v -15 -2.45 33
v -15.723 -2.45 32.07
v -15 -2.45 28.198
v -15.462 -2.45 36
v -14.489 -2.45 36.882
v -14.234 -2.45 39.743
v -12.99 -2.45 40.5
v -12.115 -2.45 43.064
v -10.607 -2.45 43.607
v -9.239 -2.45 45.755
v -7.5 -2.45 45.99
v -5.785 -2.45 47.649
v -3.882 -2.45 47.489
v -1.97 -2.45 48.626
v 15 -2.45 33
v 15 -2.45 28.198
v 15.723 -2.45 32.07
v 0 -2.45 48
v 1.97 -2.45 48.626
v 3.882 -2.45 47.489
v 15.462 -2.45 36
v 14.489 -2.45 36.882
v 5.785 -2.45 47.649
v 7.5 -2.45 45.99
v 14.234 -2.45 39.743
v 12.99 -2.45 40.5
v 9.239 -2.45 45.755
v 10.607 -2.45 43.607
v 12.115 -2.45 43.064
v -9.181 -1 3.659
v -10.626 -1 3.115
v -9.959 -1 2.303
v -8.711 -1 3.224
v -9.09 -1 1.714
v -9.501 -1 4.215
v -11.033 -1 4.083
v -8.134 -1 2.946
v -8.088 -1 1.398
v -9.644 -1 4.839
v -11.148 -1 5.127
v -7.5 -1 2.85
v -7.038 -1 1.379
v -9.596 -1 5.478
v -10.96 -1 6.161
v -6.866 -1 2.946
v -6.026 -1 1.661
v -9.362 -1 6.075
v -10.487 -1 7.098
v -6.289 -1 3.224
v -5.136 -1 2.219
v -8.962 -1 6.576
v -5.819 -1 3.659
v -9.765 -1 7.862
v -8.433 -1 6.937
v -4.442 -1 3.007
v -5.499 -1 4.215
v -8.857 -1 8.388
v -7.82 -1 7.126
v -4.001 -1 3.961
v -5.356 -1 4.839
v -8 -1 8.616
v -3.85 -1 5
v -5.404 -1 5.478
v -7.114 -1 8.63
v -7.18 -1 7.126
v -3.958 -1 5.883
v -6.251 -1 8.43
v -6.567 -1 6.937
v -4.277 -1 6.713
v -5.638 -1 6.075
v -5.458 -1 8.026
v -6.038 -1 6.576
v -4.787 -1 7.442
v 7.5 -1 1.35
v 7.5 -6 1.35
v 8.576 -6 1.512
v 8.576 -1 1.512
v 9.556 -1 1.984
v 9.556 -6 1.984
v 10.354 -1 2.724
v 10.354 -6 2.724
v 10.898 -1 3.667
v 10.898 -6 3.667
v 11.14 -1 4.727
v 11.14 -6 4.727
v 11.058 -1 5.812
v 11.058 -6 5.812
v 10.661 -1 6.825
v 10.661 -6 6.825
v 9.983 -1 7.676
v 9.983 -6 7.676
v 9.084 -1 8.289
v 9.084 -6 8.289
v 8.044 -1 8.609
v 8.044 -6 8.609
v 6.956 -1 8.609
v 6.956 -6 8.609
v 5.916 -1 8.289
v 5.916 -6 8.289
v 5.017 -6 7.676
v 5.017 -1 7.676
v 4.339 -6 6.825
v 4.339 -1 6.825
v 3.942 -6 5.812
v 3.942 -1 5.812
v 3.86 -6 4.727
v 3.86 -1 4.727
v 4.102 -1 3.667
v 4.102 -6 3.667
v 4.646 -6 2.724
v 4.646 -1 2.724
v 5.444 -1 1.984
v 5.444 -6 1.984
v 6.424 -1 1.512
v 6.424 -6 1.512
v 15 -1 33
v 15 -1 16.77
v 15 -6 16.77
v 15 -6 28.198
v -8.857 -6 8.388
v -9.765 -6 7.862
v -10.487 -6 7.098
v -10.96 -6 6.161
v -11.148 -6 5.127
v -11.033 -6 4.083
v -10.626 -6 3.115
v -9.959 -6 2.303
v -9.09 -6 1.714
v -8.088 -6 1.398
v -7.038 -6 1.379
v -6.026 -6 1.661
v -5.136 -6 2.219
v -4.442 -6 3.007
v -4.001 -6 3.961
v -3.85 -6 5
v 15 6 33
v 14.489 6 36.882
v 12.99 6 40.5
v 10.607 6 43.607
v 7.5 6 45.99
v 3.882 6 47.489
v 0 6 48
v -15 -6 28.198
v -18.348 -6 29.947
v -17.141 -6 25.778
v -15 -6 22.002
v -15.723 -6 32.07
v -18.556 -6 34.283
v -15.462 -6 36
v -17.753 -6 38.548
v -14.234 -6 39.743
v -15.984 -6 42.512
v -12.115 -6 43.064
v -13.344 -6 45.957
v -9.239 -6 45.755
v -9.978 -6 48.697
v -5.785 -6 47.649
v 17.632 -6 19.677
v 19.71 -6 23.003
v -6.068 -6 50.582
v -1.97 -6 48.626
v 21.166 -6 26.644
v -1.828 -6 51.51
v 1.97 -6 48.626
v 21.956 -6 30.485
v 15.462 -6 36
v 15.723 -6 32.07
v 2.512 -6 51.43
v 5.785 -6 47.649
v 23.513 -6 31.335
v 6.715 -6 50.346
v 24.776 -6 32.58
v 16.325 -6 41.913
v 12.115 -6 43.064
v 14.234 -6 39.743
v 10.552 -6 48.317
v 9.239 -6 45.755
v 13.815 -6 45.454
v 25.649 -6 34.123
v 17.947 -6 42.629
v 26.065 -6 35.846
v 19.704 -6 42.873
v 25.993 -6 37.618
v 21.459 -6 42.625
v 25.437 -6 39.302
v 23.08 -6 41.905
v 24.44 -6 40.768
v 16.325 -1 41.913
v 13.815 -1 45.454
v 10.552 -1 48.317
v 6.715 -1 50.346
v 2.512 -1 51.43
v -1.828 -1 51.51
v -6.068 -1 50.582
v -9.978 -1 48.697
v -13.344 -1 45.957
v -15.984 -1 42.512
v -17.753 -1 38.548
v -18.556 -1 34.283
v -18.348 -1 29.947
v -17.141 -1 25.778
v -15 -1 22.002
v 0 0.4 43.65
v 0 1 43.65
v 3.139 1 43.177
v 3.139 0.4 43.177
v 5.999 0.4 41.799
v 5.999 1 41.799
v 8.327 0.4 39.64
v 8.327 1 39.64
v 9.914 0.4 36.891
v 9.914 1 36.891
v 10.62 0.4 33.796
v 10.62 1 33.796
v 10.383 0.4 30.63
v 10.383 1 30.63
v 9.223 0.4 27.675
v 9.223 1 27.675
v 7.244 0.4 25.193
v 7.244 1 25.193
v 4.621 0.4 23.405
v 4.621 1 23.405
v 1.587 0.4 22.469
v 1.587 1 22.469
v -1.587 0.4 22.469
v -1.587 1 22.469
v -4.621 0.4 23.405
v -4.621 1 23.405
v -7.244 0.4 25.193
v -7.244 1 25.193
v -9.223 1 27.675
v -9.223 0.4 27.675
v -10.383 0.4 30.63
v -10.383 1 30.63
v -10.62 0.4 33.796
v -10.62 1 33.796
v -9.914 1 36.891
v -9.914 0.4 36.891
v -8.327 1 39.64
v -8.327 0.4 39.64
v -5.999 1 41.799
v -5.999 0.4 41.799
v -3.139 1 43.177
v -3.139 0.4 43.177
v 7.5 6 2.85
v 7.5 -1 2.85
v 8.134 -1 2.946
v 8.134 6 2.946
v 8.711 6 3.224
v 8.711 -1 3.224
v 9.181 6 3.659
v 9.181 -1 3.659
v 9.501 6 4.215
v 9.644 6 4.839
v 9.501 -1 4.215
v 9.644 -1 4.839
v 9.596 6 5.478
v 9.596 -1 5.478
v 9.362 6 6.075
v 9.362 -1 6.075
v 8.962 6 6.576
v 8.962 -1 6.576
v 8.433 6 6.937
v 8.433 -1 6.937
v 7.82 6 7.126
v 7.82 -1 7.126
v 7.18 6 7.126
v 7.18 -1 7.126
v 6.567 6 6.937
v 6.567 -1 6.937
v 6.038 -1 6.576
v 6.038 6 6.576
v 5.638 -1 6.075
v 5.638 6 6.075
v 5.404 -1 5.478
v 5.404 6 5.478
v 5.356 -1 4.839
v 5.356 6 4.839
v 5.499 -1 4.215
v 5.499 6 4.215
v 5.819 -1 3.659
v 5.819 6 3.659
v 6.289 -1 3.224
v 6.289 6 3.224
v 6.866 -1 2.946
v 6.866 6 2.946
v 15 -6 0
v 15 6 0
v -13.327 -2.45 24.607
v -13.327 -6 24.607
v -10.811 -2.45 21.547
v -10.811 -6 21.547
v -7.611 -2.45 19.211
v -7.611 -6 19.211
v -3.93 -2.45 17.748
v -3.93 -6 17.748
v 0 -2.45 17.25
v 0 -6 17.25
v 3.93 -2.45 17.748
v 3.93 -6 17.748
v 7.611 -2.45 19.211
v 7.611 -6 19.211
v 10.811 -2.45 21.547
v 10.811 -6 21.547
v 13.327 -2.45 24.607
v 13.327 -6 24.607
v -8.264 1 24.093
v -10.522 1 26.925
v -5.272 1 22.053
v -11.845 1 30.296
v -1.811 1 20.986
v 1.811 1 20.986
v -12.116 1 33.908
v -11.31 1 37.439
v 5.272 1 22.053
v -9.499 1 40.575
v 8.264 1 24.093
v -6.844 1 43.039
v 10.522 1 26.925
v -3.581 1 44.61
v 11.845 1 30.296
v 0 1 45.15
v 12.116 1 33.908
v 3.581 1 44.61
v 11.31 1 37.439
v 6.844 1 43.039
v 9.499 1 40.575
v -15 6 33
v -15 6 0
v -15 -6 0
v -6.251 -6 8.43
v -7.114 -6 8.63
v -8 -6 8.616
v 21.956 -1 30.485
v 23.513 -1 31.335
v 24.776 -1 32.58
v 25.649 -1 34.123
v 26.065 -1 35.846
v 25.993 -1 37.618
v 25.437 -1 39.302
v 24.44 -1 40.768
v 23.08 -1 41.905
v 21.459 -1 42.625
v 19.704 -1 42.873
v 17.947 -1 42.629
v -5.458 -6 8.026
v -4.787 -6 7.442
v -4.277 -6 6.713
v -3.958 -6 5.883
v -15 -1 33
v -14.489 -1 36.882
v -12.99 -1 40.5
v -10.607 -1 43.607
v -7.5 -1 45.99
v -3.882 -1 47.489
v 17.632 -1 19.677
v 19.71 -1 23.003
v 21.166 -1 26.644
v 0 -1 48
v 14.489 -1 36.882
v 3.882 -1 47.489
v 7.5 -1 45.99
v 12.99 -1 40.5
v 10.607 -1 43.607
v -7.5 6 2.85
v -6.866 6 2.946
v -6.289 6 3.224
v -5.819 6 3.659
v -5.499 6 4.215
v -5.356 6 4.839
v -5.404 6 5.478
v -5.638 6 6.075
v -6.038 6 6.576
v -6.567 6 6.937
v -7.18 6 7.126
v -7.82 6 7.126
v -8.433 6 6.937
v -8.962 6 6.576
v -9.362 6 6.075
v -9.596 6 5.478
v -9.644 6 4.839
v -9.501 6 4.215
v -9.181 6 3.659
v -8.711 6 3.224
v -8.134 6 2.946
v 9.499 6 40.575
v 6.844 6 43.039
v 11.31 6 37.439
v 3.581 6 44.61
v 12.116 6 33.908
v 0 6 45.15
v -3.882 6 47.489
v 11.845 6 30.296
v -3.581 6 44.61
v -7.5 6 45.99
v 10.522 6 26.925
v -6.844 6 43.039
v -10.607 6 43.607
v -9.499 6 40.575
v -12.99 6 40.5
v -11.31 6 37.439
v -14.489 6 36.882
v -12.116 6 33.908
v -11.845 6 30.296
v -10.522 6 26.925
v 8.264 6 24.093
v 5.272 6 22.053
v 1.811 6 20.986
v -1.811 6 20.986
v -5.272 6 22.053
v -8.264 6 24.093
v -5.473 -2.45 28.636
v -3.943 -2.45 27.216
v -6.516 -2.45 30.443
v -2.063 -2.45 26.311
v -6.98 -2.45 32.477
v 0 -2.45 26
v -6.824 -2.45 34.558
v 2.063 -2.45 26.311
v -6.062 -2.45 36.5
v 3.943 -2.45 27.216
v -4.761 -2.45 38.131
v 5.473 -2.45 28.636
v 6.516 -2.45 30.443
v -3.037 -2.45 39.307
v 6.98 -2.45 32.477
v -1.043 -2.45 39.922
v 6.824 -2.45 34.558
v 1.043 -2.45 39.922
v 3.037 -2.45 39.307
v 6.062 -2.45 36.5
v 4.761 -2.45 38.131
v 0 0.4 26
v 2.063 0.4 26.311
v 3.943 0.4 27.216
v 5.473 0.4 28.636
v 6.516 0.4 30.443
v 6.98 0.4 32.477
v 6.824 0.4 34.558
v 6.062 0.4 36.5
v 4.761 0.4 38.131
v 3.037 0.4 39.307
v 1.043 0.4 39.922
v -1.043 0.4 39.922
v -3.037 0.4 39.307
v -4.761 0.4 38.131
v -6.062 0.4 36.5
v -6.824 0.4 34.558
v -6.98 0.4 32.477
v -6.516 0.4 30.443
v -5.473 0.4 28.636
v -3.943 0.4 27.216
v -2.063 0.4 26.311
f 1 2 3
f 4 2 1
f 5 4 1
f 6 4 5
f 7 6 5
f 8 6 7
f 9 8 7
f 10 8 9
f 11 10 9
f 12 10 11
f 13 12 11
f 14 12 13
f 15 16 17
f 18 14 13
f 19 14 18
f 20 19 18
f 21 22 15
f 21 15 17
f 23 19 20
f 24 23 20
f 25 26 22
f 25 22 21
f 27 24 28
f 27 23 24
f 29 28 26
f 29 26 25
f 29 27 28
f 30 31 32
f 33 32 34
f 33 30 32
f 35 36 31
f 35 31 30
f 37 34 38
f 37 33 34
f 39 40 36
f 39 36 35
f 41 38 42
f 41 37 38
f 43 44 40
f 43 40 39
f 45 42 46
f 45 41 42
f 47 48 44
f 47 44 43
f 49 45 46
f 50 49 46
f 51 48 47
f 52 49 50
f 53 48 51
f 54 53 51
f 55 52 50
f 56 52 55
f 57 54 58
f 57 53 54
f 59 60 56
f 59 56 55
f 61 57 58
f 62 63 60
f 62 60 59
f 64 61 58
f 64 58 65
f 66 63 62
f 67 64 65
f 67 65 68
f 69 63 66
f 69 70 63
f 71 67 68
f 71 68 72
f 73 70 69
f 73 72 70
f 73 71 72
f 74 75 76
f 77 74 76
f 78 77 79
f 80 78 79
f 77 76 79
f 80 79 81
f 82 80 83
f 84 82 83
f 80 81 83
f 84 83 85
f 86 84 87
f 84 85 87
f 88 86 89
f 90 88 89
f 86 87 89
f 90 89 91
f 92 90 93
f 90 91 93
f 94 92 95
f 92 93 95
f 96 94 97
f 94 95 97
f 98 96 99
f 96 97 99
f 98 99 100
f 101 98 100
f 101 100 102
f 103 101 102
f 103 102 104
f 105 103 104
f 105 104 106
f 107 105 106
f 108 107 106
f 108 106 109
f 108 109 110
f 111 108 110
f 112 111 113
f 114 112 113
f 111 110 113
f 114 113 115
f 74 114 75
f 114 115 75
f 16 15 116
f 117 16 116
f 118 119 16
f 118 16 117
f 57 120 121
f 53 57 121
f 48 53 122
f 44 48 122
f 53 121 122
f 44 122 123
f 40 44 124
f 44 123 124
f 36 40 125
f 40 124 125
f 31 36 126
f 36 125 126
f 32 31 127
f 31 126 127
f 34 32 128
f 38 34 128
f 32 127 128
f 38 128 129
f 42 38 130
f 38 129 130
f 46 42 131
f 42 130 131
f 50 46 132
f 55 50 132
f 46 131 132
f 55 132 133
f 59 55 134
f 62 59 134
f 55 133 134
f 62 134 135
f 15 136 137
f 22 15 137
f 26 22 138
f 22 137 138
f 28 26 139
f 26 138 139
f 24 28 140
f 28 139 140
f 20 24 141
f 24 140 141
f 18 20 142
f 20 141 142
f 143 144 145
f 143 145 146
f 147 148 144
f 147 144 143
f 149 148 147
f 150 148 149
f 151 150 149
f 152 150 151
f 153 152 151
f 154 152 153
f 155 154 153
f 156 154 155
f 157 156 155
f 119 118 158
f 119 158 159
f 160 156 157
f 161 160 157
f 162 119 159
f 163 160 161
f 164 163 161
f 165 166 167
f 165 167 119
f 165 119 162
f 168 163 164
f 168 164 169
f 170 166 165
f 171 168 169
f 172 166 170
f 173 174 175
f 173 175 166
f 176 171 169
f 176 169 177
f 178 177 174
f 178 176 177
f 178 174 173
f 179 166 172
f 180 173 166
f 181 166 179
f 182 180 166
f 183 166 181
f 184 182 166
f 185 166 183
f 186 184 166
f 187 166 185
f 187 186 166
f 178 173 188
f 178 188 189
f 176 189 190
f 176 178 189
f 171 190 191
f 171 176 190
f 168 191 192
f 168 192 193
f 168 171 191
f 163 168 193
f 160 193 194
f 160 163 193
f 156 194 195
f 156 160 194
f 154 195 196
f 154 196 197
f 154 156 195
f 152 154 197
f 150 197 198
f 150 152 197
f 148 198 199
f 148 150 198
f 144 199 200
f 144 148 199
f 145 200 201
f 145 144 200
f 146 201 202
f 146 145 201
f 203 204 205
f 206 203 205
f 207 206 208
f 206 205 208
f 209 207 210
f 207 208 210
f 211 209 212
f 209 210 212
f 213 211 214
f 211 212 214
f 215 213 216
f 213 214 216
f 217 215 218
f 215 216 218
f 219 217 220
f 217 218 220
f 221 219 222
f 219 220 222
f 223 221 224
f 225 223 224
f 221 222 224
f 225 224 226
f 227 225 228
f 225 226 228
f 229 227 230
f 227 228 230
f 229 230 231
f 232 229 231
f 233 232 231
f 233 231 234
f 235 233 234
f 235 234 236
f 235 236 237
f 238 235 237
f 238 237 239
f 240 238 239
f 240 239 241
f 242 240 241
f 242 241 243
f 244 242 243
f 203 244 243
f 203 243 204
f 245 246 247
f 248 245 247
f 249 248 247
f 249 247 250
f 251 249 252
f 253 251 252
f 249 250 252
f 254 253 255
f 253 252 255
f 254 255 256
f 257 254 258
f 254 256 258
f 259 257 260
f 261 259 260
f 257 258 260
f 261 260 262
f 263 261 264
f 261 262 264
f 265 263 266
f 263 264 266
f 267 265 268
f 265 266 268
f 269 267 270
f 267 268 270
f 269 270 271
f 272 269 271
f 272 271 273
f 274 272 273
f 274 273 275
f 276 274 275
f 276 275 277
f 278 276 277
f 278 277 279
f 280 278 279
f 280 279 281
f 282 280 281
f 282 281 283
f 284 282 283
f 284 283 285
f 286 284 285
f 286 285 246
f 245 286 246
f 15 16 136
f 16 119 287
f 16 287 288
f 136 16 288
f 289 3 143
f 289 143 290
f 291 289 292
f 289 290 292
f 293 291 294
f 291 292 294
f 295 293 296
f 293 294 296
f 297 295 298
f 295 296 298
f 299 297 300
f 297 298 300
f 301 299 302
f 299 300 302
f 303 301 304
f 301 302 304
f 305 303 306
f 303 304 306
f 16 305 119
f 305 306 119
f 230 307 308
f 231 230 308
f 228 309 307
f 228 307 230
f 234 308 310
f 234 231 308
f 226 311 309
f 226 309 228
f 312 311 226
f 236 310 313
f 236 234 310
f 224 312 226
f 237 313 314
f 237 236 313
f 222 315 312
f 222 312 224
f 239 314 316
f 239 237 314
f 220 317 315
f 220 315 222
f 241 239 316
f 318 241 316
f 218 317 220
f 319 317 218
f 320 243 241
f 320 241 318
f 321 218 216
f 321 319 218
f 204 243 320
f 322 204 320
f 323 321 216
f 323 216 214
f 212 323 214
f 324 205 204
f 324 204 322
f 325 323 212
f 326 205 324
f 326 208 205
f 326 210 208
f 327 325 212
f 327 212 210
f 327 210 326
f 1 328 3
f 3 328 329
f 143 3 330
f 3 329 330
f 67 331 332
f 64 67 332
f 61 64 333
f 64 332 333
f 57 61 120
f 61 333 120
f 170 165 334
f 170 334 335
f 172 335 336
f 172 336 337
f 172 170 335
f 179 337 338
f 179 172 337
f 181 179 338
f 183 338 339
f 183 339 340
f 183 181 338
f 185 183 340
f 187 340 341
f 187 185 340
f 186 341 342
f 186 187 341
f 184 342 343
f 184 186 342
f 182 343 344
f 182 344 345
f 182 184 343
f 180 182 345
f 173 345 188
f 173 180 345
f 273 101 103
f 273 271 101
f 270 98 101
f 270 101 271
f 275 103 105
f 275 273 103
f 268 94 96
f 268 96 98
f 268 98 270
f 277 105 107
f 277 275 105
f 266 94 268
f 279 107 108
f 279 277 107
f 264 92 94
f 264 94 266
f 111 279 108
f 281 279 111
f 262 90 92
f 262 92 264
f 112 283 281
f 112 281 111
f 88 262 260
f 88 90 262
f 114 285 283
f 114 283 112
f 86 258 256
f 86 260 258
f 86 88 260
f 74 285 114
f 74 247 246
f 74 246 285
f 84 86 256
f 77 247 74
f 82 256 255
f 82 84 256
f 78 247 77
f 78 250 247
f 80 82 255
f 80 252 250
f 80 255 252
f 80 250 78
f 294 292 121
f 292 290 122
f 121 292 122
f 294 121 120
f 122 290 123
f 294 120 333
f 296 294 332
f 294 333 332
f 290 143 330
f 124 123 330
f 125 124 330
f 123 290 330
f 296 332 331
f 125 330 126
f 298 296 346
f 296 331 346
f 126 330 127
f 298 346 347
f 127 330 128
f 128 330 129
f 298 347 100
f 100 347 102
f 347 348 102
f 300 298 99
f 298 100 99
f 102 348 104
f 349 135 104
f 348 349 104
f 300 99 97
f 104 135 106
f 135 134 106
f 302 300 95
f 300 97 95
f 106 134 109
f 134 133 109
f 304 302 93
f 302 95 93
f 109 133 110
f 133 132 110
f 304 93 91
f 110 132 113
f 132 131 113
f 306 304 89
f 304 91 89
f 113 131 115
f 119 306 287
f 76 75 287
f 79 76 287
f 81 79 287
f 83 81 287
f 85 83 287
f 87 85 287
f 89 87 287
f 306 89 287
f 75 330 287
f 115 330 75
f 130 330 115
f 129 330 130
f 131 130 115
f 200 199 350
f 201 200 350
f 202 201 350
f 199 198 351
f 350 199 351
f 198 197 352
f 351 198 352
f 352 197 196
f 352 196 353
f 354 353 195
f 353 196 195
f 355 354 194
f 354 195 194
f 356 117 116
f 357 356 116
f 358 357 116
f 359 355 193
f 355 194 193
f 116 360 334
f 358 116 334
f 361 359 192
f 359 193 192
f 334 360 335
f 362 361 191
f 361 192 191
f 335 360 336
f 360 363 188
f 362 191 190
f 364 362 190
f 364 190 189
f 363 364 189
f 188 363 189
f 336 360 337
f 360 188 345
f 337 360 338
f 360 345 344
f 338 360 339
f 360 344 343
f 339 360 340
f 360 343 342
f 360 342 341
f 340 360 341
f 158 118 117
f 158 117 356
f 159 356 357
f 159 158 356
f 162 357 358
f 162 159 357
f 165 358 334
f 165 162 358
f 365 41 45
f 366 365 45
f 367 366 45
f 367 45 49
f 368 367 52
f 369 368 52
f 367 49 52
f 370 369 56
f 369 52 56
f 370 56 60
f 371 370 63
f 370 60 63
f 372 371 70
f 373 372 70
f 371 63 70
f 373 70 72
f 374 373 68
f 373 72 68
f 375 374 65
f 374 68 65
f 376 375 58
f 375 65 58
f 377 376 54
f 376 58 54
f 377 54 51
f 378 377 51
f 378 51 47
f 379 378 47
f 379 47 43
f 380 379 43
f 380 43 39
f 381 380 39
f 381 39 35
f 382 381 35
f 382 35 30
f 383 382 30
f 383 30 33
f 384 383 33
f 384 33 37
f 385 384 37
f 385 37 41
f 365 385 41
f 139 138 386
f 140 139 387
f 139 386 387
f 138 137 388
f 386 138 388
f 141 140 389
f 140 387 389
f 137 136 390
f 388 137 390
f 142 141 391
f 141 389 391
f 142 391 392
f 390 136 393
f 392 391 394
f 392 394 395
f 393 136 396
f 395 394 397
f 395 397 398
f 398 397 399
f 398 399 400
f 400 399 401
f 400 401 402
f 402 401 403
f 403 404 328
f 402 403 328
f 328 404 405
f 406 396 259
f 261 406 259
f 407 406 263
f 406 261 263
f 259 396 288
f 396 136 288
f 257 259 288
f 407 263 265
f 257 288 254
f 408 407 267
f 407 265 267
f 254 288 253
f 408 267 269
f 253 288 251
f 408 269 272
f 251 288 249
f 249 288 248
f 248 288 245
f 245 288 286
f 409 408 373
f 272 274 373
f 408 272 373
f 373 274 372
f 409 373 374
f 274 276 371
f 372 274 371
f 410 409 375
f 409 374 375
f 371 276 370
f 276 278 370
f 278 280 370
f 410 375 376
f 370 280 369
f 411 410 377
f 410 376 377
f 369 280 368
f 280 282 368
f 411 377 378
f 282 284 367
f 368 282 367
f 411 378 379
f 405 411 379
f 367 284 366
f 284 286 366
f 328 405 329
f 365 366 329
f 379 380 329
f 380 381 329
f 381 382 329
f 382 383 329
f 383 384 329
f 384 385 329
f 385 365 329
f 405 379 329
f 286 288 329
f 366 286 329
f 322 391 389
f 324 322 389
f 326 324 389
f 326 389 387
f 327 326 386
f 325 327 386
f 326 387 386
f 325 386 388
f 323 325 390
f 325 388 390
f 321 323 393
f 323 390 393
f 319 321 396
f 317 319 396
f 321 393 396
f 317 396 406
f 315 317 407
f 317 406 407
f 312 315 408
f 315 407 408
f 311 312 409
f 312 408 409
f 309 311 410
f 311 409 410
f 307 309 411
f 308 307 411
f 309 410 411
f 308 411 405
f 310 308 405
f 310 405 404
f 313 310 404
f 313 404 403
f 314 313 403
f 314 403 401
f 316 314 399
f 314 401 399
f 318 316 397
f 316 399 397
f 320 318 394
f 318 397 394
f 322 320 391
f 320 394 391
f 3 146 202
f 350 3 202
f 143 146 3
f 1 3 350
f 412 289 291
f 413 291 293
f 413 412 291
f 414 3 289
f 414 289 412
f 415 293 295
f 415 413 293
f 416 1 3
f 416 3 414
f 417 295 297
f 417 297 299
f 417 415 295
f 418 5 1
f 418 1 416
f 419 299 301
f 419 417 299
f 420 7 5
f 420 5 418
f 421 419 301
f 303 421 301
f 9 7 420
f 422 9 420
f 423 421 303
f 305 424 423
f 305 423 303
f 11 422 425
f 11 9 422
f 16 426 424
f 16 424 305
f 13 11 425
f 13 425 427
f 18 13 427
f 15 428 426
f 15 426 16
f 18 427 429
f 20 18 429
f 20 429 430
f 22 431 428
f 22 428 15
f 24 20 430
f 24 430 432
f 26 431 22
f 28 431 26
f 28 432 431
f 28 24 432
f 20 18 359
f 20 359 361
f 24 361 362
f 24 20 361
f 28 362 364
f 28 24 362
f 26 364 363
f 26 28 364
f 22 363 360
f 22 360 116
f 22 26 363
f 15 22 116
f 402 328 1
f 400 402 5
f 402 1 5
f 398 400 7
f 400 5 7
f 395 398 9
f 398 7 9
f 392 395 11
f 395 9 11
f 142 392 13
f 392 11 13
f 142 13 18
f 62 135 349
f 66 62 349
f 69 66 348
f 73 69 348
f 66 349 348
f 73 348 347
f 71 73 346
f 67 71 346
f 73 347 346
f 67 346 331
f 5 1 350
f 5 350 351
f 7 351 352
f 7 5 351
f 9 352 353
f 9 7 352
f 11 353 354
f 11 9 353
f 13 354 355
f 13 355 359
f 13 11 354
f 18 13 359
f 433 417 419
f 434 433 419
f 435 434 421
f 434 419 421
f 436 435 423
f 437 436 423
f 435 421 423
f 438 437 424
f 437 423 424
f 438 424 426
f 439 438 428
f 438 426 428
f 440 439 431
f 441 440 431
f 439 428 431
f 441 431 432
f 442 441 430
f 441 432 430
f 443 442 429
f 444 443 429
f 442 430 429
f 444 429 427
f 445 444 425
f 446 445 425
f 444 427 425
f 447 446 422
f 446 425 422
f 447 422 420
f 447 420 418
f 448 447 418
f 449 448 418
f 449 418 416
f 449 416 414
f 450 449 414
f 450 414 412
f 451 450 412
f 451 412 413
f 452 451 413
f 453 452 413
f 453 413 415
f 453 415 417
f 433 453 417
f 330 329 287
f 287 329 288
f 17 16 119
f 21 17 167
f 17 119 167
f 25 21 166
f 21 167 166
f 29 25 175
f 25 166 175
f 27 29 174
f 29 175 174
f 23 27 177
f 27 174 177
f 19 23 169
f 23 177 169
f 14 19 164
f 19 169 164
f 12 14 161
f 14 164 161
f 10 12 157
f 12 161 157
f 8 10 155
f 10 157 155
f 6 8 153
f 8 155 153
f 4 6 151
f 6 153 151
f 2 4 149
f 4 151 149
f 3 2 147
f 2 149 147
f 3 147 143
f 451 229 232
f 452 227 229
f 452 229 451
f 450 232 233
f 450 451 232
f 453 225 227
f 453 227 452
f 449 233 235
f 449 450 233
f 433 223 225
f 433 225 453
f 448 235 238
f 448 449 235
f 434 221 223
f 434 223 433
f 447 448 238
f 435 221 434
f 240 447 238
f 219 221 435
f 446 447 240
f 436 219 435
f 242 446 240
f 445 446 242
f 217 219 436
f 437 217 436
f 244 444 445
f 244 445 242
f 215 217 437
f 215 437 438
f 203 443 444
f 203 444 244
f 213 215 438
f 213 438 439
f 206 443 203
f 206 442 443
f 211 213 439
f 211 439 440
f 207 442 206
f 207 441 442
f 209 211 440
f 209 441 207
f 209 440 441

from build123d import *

# Parameters (mm, degrees)
EXTRUDE_873_DEPTH      = 48
FILLET_1_R             = 15
SKETCH_2533_R          = 1
EXTRUDE_4839_DEPTH     = 5
SKETCH_1_4_R           = 15.75
CUT_EXTRUDE_5054_DEPTH = 3.55
SKETCH_1_5_R           = 2.15
SKETCH_1_5_R_2         = 7
CUT_EXTRUDE_5752_DEPTH = 12
SKETCH_5896_R          = 12.15
SKETCH_5896_R_2        = 10.65
CUT_EXTRUDE_6261_DEPTH = 5
SKETCH_2_3_R           = 10.65
CUT_EXTRUDE_6307_DEPTH = 5.6
SKETCH_7_R             = 2.15
SKETCH_7_R_2           = 3.65
CUT_EXTRUDE_6391_DEPTH = 5


with BuildPart() as part:
    # Sketch 353 → Extrude 873 (new body)
    with BuildSketch(Plane.XY):
        Polygon((-1e-08, 3.5), (-15, 3.5), (-15, -6), (15, -6), (15, 3.5), align=None)
        with BuildLine():
            Line((-15, 6), (-15, 3.5))
            Line((-15, 3.5), (-1e-08, 3.5))
            ThreePointArc((-1e-08, 3.5), (-4.330127024, 4.138593385), (-8.291561976, 6))
            Line((-8.291561976, 6), (-15, 6))
        make_face()
        with BuildLine():
            ThreePointArc((-8.291561976, 6), (-4.330127024, 4.138593385), (-1e-08, 3.5))
            ThreePointArc((-1e-08, 3.5), (4.330127014, 4.138593382), (8.291561976, 6))
            Line((8.291561976, 6), (-8.291561976, 6))
        make_face()
        with BuildLine():
            ThreePointArc((8.291561976, 6), (4.330127014, 4.138593382), (-1e-08, 3.5))
            Line((-1e-08, 3.5), (15, 3.5))
            Line((15, 3.5), (15, 6))
            Line((15, 6), (8.291561976, 6))
        make_face()
    extrude(amount=EXTRUDE_873_DEPTH)

    # Скругление1
    fillet_1_edges = [part.edges().sort_by_distance(p)[0] for p in [
        (-15, 0, 48),
        (15, 0, 48),
    ]]
    fillet(fillet_1_edges, radius=FILLET_1_R - 0.0001)  # a hair under: the kernel refuses the full size


with BuildPart() as body_2:
    # Sketch 2533 → Extrude 4839 (new body)
    # profile 1 of 5: a face of its own
    with BuildSketch(Plane.XZ.offset(6)):
        with BuildLine():
            Line((-15, 22.001818332), (-15, 23.793480571))
            ThreePointArc((-15, 23.793480571), (-8.310689955, 48.514265451), (15.975091459, 40.386234011))
            ThreePointArc((15.975091459, 40.386234011), (24.423228184, 39.083476852), (21.026417078, 31.239379412))
            ThreePointArc((21.026417078, 31.239379412), (19.163501403, 24.169925597), (15, 18.160525616))
            Line((15, 18.160525616), (15, 16.770089341))
            ThreePointArc((15, 16.770089341), (19.709709926, 23.003133759), (21.956474455, 30.485396749))
            ThreePointArc((21.956474455, 30.485396749), (25.437011886, 39.301843704), (16.325243686, 41.913272047))
            ThreePointArc((16.325243686, 41.913272047), (-9.977753503, 48.697274764), (-15, 22.001818332))
        make_face()
    # profile 2 of 5: a face of its own
    with BuildSketch(Plane.XZ.offset(6)):
        with BuildLine():
            Line((-15, 23.793480571), (-15, 28.197656822))
            ThreePointArc((-15, 28.197656822), (-2.430277762, 48.561370441), (15.75, 33))
            ThreePointArc((15.75, 33), (15.561370441, 30.569722238), (15, 28.197656822))
            Line((15, 28.197656822), (15, 18.160525616))
            ThreePointArc((15, 18.160525616), (19.163501403, 24.169925597), (21.026417078, 31.239379412))
            ThreePointArc((21.026417078, 31.239379412), (24.423228184, 39.083476852), (15.975091459, 40.386234011))
            ThreePointArc((15.975091459, 40.386234011), (-8.310689955, 48.514265451), (-15, 23.793480571))
        make_face()
        with BuildLine():
            ThreePointArc((18.566239786, 34.242875781), (16.249327925, 35.865194932), (17.871647075, 38.182106793))
            Line((17.871647075, 38.182106793), (20.826070334, 38.703051326))
            ThreePointArc((20.826070334, 38.703051326), (23.142982196, 37.080732175), (21.520663045, 34.763820314))
            Line((21.520663045, 34.763820314), (18.566239786, 34.242875781))
        make_face(mode=Mode.SUBTRACT)
    # profile 3 of 5: a face of its own
    with BuildSketch(Plane.XZ.offset(6)):
        with BuildLine():
            ThreePointArc((20.826070334, 38.703051326), (23.142982196, 37.080732175), (21.520663045, 34.763820314))
            Line((21.520663045, 34.763820314), (18.566239786, 34.242875781))
            ThreePointArc((18.566239786, 34.242875781), (16.249327925, 35.865194932), (17.871647075, 38.182106793))
            Line((17.871647075, 38.182106793), (20.826070334, 38.703051326))
        make_face()
        with Locations((19.69615506, 36.472963553)):
            Circle(SKETCH_2533_R, mode=Mode.SUBTRACT)
    # profile 4 of 5: a face of its own
    with BuildSketch(Plane.XZ.offset(6)):
        with BuildLine():
            Line((-15, 28.197656822), (-15, 33))
            ThreePointArc((-15, 33), (-10.606601718, 43.606601718), (0, 48))
            ThreePointArc((0, 48), (10.606601718, 43.606601718), (15, 33))
            Line((15, 33), (15, 28.197656822))
            ThreePointArc((15, 28.197656822), (15.561370441, 30.569722238), (15.75, 33))
            ThreePointArc((15.75, 33), (-2.430277762, 48.561370441), (-15, 28.197656822))
        make_face()
    # profile 5 of 5: a face of its own
    with BuildSketch(Plane.XZ.offset(6)):
        with Locations((19.69615506, 36.472963553)):
            Circle(SKETCH_2533_R)
    extrude(amount=-EXTRUDE_4839_DEPTH)


with BuildPart() as cut_extrude_5054_tool:
    # Эскиз1<4> → Cut-Extrude 5054 (new body)
    with BuildSketch(Plane.XZ.offset(6)):
        with Locations((0, 33)):
            Circle(SKETCH_1_4_R)
    extrude(amount=-CUT_EXTRUDE_5054_DEPTH)


with BuildPart() as part_1:
    add(part.part)

    # Cut-Extrude 5054: cut by cut_extrude_5054_tool
    add(cut_extrude_5054_tool.part, mode=Mode.SUBTRACT)

    # Sketch 1_5 → Cut-Extrude 5752 (cut)
    with BuildSketch(Plane.XZ.offset(6)):
        with Locations(Location((7.5, 5, 0), (0, 0, 270))):
            Circle(SKETCH_1_5_R)
        with Locations(Location((-7.5, 5, 0), (0, 0, 270))):
            Circle(SKETCH_1_5_R)
        with Locations(Location((0, 33, 0), (0, 0, 270))):
            Circle(SKETCH_1_5_R_2)
    extrude(amount=-CUT_EXTRUDE_5752_DEPTH, mode=Mode.SUBTRACT)

    # Sketch 5896 → Cut-Extrude 6261 (cut)
    with BuildSketch(Plane(origin=(0, 6, 0), x_dir=(1, 0, 0), z_dir=(0, 1, 0))):
        with Locations(Location((0, -33, 0), (0, 0, 270))):
            Circle(SKETCH_5896_R)
        with Locations(Location((0, -33, 0), (0, 0, 270))):
            Circle(SKETCH_5896_R_2, mode=Mode.SUBTRACT)
    extrude(amount=-CUT_EXTRUDE_6261_DEPTH, mode=Mode.SUBTRACT)

    # Sketch 2_3 → Cut-Extrude 6307 (cut)
    with BuildSketch(Plane(origin=(0, 6, 0), x_dir=(1, 0, 0), z_dir=(0, 1, 0))):
        with Locations(Location((0, -33, 0), (0, 0, 270))):
            Circle(SKETCH_2_3_R)
    extrude(amount=-CUT_EXTRUDE_6307_DEPTH, mode=Mode.SUBTRACT)

    # Эскиз под резистор<7> → Cut-Extrude 6391 (cut)
    # profile 1 of 3: a face of its own
    with BuildSketch(Plane.XZ.offset(6)):
        with BuildLine():
            ThreePointArc((-6.250710878, 8.429544677), (-7.551544535, 8.271665699), (-8.856706058, 8.388487667))
            ThreePointArc((-8.856706058, 8.388487667), (-9.545791154, 1.977213445), (-3.85, 5))
            ThreePointArc((-3.85, 5), (-4.509815617, 7.09315488), (-6.250710878, 8.429544677))
        make_face()
        with Locations(Location((-7.5, 5, 0), (0, 0, 270))):
            Circle(SKETCH_7_R, mode=Mode.SUBTRACT)
    # profile 2 of 3: a face of its own
    with BuildSketch(Plane.XZ.offset(6)):
        with BuildLine():
            ThreePointArc((-6.250710878, 8.429544677), (-7.557497992, 8.649547093), (-8.856706058, 8.388487667))
            ThreePointArc((-8.856706058, 8.388487667), (-7.551544535, 8.271665699), (-6.250710878, 8.429544677))
        make_face()
    # profile 3 of 3: a face of its own
    with BuildSketch(Plane.XZ.offset(6)):
        with Locations(Location((7.5, 5, 0), (0, 0, 270))):
            Circle(SKETCH_7_R_2)
        with Locations(Location((7.5, 5, 0), (0, 0, 270))):
            Circle(SKETCH_7_R, mode=Mode.SUBTRACT)
    extrude(amount=-CUT_EXTRUDE_6391_DEPTH, mode=Mode.SUBTRACT)


with BuildPart() as body_2_1:
    add(body_2.part)

    # Cut-Extrude 5054: cut by cut_extrude_5054_tool
    add(cut_extrude_5054_tool.part, mode=Mode.SUBTRACT)


solid = Compound([part_1.part, body_2_1.part])
